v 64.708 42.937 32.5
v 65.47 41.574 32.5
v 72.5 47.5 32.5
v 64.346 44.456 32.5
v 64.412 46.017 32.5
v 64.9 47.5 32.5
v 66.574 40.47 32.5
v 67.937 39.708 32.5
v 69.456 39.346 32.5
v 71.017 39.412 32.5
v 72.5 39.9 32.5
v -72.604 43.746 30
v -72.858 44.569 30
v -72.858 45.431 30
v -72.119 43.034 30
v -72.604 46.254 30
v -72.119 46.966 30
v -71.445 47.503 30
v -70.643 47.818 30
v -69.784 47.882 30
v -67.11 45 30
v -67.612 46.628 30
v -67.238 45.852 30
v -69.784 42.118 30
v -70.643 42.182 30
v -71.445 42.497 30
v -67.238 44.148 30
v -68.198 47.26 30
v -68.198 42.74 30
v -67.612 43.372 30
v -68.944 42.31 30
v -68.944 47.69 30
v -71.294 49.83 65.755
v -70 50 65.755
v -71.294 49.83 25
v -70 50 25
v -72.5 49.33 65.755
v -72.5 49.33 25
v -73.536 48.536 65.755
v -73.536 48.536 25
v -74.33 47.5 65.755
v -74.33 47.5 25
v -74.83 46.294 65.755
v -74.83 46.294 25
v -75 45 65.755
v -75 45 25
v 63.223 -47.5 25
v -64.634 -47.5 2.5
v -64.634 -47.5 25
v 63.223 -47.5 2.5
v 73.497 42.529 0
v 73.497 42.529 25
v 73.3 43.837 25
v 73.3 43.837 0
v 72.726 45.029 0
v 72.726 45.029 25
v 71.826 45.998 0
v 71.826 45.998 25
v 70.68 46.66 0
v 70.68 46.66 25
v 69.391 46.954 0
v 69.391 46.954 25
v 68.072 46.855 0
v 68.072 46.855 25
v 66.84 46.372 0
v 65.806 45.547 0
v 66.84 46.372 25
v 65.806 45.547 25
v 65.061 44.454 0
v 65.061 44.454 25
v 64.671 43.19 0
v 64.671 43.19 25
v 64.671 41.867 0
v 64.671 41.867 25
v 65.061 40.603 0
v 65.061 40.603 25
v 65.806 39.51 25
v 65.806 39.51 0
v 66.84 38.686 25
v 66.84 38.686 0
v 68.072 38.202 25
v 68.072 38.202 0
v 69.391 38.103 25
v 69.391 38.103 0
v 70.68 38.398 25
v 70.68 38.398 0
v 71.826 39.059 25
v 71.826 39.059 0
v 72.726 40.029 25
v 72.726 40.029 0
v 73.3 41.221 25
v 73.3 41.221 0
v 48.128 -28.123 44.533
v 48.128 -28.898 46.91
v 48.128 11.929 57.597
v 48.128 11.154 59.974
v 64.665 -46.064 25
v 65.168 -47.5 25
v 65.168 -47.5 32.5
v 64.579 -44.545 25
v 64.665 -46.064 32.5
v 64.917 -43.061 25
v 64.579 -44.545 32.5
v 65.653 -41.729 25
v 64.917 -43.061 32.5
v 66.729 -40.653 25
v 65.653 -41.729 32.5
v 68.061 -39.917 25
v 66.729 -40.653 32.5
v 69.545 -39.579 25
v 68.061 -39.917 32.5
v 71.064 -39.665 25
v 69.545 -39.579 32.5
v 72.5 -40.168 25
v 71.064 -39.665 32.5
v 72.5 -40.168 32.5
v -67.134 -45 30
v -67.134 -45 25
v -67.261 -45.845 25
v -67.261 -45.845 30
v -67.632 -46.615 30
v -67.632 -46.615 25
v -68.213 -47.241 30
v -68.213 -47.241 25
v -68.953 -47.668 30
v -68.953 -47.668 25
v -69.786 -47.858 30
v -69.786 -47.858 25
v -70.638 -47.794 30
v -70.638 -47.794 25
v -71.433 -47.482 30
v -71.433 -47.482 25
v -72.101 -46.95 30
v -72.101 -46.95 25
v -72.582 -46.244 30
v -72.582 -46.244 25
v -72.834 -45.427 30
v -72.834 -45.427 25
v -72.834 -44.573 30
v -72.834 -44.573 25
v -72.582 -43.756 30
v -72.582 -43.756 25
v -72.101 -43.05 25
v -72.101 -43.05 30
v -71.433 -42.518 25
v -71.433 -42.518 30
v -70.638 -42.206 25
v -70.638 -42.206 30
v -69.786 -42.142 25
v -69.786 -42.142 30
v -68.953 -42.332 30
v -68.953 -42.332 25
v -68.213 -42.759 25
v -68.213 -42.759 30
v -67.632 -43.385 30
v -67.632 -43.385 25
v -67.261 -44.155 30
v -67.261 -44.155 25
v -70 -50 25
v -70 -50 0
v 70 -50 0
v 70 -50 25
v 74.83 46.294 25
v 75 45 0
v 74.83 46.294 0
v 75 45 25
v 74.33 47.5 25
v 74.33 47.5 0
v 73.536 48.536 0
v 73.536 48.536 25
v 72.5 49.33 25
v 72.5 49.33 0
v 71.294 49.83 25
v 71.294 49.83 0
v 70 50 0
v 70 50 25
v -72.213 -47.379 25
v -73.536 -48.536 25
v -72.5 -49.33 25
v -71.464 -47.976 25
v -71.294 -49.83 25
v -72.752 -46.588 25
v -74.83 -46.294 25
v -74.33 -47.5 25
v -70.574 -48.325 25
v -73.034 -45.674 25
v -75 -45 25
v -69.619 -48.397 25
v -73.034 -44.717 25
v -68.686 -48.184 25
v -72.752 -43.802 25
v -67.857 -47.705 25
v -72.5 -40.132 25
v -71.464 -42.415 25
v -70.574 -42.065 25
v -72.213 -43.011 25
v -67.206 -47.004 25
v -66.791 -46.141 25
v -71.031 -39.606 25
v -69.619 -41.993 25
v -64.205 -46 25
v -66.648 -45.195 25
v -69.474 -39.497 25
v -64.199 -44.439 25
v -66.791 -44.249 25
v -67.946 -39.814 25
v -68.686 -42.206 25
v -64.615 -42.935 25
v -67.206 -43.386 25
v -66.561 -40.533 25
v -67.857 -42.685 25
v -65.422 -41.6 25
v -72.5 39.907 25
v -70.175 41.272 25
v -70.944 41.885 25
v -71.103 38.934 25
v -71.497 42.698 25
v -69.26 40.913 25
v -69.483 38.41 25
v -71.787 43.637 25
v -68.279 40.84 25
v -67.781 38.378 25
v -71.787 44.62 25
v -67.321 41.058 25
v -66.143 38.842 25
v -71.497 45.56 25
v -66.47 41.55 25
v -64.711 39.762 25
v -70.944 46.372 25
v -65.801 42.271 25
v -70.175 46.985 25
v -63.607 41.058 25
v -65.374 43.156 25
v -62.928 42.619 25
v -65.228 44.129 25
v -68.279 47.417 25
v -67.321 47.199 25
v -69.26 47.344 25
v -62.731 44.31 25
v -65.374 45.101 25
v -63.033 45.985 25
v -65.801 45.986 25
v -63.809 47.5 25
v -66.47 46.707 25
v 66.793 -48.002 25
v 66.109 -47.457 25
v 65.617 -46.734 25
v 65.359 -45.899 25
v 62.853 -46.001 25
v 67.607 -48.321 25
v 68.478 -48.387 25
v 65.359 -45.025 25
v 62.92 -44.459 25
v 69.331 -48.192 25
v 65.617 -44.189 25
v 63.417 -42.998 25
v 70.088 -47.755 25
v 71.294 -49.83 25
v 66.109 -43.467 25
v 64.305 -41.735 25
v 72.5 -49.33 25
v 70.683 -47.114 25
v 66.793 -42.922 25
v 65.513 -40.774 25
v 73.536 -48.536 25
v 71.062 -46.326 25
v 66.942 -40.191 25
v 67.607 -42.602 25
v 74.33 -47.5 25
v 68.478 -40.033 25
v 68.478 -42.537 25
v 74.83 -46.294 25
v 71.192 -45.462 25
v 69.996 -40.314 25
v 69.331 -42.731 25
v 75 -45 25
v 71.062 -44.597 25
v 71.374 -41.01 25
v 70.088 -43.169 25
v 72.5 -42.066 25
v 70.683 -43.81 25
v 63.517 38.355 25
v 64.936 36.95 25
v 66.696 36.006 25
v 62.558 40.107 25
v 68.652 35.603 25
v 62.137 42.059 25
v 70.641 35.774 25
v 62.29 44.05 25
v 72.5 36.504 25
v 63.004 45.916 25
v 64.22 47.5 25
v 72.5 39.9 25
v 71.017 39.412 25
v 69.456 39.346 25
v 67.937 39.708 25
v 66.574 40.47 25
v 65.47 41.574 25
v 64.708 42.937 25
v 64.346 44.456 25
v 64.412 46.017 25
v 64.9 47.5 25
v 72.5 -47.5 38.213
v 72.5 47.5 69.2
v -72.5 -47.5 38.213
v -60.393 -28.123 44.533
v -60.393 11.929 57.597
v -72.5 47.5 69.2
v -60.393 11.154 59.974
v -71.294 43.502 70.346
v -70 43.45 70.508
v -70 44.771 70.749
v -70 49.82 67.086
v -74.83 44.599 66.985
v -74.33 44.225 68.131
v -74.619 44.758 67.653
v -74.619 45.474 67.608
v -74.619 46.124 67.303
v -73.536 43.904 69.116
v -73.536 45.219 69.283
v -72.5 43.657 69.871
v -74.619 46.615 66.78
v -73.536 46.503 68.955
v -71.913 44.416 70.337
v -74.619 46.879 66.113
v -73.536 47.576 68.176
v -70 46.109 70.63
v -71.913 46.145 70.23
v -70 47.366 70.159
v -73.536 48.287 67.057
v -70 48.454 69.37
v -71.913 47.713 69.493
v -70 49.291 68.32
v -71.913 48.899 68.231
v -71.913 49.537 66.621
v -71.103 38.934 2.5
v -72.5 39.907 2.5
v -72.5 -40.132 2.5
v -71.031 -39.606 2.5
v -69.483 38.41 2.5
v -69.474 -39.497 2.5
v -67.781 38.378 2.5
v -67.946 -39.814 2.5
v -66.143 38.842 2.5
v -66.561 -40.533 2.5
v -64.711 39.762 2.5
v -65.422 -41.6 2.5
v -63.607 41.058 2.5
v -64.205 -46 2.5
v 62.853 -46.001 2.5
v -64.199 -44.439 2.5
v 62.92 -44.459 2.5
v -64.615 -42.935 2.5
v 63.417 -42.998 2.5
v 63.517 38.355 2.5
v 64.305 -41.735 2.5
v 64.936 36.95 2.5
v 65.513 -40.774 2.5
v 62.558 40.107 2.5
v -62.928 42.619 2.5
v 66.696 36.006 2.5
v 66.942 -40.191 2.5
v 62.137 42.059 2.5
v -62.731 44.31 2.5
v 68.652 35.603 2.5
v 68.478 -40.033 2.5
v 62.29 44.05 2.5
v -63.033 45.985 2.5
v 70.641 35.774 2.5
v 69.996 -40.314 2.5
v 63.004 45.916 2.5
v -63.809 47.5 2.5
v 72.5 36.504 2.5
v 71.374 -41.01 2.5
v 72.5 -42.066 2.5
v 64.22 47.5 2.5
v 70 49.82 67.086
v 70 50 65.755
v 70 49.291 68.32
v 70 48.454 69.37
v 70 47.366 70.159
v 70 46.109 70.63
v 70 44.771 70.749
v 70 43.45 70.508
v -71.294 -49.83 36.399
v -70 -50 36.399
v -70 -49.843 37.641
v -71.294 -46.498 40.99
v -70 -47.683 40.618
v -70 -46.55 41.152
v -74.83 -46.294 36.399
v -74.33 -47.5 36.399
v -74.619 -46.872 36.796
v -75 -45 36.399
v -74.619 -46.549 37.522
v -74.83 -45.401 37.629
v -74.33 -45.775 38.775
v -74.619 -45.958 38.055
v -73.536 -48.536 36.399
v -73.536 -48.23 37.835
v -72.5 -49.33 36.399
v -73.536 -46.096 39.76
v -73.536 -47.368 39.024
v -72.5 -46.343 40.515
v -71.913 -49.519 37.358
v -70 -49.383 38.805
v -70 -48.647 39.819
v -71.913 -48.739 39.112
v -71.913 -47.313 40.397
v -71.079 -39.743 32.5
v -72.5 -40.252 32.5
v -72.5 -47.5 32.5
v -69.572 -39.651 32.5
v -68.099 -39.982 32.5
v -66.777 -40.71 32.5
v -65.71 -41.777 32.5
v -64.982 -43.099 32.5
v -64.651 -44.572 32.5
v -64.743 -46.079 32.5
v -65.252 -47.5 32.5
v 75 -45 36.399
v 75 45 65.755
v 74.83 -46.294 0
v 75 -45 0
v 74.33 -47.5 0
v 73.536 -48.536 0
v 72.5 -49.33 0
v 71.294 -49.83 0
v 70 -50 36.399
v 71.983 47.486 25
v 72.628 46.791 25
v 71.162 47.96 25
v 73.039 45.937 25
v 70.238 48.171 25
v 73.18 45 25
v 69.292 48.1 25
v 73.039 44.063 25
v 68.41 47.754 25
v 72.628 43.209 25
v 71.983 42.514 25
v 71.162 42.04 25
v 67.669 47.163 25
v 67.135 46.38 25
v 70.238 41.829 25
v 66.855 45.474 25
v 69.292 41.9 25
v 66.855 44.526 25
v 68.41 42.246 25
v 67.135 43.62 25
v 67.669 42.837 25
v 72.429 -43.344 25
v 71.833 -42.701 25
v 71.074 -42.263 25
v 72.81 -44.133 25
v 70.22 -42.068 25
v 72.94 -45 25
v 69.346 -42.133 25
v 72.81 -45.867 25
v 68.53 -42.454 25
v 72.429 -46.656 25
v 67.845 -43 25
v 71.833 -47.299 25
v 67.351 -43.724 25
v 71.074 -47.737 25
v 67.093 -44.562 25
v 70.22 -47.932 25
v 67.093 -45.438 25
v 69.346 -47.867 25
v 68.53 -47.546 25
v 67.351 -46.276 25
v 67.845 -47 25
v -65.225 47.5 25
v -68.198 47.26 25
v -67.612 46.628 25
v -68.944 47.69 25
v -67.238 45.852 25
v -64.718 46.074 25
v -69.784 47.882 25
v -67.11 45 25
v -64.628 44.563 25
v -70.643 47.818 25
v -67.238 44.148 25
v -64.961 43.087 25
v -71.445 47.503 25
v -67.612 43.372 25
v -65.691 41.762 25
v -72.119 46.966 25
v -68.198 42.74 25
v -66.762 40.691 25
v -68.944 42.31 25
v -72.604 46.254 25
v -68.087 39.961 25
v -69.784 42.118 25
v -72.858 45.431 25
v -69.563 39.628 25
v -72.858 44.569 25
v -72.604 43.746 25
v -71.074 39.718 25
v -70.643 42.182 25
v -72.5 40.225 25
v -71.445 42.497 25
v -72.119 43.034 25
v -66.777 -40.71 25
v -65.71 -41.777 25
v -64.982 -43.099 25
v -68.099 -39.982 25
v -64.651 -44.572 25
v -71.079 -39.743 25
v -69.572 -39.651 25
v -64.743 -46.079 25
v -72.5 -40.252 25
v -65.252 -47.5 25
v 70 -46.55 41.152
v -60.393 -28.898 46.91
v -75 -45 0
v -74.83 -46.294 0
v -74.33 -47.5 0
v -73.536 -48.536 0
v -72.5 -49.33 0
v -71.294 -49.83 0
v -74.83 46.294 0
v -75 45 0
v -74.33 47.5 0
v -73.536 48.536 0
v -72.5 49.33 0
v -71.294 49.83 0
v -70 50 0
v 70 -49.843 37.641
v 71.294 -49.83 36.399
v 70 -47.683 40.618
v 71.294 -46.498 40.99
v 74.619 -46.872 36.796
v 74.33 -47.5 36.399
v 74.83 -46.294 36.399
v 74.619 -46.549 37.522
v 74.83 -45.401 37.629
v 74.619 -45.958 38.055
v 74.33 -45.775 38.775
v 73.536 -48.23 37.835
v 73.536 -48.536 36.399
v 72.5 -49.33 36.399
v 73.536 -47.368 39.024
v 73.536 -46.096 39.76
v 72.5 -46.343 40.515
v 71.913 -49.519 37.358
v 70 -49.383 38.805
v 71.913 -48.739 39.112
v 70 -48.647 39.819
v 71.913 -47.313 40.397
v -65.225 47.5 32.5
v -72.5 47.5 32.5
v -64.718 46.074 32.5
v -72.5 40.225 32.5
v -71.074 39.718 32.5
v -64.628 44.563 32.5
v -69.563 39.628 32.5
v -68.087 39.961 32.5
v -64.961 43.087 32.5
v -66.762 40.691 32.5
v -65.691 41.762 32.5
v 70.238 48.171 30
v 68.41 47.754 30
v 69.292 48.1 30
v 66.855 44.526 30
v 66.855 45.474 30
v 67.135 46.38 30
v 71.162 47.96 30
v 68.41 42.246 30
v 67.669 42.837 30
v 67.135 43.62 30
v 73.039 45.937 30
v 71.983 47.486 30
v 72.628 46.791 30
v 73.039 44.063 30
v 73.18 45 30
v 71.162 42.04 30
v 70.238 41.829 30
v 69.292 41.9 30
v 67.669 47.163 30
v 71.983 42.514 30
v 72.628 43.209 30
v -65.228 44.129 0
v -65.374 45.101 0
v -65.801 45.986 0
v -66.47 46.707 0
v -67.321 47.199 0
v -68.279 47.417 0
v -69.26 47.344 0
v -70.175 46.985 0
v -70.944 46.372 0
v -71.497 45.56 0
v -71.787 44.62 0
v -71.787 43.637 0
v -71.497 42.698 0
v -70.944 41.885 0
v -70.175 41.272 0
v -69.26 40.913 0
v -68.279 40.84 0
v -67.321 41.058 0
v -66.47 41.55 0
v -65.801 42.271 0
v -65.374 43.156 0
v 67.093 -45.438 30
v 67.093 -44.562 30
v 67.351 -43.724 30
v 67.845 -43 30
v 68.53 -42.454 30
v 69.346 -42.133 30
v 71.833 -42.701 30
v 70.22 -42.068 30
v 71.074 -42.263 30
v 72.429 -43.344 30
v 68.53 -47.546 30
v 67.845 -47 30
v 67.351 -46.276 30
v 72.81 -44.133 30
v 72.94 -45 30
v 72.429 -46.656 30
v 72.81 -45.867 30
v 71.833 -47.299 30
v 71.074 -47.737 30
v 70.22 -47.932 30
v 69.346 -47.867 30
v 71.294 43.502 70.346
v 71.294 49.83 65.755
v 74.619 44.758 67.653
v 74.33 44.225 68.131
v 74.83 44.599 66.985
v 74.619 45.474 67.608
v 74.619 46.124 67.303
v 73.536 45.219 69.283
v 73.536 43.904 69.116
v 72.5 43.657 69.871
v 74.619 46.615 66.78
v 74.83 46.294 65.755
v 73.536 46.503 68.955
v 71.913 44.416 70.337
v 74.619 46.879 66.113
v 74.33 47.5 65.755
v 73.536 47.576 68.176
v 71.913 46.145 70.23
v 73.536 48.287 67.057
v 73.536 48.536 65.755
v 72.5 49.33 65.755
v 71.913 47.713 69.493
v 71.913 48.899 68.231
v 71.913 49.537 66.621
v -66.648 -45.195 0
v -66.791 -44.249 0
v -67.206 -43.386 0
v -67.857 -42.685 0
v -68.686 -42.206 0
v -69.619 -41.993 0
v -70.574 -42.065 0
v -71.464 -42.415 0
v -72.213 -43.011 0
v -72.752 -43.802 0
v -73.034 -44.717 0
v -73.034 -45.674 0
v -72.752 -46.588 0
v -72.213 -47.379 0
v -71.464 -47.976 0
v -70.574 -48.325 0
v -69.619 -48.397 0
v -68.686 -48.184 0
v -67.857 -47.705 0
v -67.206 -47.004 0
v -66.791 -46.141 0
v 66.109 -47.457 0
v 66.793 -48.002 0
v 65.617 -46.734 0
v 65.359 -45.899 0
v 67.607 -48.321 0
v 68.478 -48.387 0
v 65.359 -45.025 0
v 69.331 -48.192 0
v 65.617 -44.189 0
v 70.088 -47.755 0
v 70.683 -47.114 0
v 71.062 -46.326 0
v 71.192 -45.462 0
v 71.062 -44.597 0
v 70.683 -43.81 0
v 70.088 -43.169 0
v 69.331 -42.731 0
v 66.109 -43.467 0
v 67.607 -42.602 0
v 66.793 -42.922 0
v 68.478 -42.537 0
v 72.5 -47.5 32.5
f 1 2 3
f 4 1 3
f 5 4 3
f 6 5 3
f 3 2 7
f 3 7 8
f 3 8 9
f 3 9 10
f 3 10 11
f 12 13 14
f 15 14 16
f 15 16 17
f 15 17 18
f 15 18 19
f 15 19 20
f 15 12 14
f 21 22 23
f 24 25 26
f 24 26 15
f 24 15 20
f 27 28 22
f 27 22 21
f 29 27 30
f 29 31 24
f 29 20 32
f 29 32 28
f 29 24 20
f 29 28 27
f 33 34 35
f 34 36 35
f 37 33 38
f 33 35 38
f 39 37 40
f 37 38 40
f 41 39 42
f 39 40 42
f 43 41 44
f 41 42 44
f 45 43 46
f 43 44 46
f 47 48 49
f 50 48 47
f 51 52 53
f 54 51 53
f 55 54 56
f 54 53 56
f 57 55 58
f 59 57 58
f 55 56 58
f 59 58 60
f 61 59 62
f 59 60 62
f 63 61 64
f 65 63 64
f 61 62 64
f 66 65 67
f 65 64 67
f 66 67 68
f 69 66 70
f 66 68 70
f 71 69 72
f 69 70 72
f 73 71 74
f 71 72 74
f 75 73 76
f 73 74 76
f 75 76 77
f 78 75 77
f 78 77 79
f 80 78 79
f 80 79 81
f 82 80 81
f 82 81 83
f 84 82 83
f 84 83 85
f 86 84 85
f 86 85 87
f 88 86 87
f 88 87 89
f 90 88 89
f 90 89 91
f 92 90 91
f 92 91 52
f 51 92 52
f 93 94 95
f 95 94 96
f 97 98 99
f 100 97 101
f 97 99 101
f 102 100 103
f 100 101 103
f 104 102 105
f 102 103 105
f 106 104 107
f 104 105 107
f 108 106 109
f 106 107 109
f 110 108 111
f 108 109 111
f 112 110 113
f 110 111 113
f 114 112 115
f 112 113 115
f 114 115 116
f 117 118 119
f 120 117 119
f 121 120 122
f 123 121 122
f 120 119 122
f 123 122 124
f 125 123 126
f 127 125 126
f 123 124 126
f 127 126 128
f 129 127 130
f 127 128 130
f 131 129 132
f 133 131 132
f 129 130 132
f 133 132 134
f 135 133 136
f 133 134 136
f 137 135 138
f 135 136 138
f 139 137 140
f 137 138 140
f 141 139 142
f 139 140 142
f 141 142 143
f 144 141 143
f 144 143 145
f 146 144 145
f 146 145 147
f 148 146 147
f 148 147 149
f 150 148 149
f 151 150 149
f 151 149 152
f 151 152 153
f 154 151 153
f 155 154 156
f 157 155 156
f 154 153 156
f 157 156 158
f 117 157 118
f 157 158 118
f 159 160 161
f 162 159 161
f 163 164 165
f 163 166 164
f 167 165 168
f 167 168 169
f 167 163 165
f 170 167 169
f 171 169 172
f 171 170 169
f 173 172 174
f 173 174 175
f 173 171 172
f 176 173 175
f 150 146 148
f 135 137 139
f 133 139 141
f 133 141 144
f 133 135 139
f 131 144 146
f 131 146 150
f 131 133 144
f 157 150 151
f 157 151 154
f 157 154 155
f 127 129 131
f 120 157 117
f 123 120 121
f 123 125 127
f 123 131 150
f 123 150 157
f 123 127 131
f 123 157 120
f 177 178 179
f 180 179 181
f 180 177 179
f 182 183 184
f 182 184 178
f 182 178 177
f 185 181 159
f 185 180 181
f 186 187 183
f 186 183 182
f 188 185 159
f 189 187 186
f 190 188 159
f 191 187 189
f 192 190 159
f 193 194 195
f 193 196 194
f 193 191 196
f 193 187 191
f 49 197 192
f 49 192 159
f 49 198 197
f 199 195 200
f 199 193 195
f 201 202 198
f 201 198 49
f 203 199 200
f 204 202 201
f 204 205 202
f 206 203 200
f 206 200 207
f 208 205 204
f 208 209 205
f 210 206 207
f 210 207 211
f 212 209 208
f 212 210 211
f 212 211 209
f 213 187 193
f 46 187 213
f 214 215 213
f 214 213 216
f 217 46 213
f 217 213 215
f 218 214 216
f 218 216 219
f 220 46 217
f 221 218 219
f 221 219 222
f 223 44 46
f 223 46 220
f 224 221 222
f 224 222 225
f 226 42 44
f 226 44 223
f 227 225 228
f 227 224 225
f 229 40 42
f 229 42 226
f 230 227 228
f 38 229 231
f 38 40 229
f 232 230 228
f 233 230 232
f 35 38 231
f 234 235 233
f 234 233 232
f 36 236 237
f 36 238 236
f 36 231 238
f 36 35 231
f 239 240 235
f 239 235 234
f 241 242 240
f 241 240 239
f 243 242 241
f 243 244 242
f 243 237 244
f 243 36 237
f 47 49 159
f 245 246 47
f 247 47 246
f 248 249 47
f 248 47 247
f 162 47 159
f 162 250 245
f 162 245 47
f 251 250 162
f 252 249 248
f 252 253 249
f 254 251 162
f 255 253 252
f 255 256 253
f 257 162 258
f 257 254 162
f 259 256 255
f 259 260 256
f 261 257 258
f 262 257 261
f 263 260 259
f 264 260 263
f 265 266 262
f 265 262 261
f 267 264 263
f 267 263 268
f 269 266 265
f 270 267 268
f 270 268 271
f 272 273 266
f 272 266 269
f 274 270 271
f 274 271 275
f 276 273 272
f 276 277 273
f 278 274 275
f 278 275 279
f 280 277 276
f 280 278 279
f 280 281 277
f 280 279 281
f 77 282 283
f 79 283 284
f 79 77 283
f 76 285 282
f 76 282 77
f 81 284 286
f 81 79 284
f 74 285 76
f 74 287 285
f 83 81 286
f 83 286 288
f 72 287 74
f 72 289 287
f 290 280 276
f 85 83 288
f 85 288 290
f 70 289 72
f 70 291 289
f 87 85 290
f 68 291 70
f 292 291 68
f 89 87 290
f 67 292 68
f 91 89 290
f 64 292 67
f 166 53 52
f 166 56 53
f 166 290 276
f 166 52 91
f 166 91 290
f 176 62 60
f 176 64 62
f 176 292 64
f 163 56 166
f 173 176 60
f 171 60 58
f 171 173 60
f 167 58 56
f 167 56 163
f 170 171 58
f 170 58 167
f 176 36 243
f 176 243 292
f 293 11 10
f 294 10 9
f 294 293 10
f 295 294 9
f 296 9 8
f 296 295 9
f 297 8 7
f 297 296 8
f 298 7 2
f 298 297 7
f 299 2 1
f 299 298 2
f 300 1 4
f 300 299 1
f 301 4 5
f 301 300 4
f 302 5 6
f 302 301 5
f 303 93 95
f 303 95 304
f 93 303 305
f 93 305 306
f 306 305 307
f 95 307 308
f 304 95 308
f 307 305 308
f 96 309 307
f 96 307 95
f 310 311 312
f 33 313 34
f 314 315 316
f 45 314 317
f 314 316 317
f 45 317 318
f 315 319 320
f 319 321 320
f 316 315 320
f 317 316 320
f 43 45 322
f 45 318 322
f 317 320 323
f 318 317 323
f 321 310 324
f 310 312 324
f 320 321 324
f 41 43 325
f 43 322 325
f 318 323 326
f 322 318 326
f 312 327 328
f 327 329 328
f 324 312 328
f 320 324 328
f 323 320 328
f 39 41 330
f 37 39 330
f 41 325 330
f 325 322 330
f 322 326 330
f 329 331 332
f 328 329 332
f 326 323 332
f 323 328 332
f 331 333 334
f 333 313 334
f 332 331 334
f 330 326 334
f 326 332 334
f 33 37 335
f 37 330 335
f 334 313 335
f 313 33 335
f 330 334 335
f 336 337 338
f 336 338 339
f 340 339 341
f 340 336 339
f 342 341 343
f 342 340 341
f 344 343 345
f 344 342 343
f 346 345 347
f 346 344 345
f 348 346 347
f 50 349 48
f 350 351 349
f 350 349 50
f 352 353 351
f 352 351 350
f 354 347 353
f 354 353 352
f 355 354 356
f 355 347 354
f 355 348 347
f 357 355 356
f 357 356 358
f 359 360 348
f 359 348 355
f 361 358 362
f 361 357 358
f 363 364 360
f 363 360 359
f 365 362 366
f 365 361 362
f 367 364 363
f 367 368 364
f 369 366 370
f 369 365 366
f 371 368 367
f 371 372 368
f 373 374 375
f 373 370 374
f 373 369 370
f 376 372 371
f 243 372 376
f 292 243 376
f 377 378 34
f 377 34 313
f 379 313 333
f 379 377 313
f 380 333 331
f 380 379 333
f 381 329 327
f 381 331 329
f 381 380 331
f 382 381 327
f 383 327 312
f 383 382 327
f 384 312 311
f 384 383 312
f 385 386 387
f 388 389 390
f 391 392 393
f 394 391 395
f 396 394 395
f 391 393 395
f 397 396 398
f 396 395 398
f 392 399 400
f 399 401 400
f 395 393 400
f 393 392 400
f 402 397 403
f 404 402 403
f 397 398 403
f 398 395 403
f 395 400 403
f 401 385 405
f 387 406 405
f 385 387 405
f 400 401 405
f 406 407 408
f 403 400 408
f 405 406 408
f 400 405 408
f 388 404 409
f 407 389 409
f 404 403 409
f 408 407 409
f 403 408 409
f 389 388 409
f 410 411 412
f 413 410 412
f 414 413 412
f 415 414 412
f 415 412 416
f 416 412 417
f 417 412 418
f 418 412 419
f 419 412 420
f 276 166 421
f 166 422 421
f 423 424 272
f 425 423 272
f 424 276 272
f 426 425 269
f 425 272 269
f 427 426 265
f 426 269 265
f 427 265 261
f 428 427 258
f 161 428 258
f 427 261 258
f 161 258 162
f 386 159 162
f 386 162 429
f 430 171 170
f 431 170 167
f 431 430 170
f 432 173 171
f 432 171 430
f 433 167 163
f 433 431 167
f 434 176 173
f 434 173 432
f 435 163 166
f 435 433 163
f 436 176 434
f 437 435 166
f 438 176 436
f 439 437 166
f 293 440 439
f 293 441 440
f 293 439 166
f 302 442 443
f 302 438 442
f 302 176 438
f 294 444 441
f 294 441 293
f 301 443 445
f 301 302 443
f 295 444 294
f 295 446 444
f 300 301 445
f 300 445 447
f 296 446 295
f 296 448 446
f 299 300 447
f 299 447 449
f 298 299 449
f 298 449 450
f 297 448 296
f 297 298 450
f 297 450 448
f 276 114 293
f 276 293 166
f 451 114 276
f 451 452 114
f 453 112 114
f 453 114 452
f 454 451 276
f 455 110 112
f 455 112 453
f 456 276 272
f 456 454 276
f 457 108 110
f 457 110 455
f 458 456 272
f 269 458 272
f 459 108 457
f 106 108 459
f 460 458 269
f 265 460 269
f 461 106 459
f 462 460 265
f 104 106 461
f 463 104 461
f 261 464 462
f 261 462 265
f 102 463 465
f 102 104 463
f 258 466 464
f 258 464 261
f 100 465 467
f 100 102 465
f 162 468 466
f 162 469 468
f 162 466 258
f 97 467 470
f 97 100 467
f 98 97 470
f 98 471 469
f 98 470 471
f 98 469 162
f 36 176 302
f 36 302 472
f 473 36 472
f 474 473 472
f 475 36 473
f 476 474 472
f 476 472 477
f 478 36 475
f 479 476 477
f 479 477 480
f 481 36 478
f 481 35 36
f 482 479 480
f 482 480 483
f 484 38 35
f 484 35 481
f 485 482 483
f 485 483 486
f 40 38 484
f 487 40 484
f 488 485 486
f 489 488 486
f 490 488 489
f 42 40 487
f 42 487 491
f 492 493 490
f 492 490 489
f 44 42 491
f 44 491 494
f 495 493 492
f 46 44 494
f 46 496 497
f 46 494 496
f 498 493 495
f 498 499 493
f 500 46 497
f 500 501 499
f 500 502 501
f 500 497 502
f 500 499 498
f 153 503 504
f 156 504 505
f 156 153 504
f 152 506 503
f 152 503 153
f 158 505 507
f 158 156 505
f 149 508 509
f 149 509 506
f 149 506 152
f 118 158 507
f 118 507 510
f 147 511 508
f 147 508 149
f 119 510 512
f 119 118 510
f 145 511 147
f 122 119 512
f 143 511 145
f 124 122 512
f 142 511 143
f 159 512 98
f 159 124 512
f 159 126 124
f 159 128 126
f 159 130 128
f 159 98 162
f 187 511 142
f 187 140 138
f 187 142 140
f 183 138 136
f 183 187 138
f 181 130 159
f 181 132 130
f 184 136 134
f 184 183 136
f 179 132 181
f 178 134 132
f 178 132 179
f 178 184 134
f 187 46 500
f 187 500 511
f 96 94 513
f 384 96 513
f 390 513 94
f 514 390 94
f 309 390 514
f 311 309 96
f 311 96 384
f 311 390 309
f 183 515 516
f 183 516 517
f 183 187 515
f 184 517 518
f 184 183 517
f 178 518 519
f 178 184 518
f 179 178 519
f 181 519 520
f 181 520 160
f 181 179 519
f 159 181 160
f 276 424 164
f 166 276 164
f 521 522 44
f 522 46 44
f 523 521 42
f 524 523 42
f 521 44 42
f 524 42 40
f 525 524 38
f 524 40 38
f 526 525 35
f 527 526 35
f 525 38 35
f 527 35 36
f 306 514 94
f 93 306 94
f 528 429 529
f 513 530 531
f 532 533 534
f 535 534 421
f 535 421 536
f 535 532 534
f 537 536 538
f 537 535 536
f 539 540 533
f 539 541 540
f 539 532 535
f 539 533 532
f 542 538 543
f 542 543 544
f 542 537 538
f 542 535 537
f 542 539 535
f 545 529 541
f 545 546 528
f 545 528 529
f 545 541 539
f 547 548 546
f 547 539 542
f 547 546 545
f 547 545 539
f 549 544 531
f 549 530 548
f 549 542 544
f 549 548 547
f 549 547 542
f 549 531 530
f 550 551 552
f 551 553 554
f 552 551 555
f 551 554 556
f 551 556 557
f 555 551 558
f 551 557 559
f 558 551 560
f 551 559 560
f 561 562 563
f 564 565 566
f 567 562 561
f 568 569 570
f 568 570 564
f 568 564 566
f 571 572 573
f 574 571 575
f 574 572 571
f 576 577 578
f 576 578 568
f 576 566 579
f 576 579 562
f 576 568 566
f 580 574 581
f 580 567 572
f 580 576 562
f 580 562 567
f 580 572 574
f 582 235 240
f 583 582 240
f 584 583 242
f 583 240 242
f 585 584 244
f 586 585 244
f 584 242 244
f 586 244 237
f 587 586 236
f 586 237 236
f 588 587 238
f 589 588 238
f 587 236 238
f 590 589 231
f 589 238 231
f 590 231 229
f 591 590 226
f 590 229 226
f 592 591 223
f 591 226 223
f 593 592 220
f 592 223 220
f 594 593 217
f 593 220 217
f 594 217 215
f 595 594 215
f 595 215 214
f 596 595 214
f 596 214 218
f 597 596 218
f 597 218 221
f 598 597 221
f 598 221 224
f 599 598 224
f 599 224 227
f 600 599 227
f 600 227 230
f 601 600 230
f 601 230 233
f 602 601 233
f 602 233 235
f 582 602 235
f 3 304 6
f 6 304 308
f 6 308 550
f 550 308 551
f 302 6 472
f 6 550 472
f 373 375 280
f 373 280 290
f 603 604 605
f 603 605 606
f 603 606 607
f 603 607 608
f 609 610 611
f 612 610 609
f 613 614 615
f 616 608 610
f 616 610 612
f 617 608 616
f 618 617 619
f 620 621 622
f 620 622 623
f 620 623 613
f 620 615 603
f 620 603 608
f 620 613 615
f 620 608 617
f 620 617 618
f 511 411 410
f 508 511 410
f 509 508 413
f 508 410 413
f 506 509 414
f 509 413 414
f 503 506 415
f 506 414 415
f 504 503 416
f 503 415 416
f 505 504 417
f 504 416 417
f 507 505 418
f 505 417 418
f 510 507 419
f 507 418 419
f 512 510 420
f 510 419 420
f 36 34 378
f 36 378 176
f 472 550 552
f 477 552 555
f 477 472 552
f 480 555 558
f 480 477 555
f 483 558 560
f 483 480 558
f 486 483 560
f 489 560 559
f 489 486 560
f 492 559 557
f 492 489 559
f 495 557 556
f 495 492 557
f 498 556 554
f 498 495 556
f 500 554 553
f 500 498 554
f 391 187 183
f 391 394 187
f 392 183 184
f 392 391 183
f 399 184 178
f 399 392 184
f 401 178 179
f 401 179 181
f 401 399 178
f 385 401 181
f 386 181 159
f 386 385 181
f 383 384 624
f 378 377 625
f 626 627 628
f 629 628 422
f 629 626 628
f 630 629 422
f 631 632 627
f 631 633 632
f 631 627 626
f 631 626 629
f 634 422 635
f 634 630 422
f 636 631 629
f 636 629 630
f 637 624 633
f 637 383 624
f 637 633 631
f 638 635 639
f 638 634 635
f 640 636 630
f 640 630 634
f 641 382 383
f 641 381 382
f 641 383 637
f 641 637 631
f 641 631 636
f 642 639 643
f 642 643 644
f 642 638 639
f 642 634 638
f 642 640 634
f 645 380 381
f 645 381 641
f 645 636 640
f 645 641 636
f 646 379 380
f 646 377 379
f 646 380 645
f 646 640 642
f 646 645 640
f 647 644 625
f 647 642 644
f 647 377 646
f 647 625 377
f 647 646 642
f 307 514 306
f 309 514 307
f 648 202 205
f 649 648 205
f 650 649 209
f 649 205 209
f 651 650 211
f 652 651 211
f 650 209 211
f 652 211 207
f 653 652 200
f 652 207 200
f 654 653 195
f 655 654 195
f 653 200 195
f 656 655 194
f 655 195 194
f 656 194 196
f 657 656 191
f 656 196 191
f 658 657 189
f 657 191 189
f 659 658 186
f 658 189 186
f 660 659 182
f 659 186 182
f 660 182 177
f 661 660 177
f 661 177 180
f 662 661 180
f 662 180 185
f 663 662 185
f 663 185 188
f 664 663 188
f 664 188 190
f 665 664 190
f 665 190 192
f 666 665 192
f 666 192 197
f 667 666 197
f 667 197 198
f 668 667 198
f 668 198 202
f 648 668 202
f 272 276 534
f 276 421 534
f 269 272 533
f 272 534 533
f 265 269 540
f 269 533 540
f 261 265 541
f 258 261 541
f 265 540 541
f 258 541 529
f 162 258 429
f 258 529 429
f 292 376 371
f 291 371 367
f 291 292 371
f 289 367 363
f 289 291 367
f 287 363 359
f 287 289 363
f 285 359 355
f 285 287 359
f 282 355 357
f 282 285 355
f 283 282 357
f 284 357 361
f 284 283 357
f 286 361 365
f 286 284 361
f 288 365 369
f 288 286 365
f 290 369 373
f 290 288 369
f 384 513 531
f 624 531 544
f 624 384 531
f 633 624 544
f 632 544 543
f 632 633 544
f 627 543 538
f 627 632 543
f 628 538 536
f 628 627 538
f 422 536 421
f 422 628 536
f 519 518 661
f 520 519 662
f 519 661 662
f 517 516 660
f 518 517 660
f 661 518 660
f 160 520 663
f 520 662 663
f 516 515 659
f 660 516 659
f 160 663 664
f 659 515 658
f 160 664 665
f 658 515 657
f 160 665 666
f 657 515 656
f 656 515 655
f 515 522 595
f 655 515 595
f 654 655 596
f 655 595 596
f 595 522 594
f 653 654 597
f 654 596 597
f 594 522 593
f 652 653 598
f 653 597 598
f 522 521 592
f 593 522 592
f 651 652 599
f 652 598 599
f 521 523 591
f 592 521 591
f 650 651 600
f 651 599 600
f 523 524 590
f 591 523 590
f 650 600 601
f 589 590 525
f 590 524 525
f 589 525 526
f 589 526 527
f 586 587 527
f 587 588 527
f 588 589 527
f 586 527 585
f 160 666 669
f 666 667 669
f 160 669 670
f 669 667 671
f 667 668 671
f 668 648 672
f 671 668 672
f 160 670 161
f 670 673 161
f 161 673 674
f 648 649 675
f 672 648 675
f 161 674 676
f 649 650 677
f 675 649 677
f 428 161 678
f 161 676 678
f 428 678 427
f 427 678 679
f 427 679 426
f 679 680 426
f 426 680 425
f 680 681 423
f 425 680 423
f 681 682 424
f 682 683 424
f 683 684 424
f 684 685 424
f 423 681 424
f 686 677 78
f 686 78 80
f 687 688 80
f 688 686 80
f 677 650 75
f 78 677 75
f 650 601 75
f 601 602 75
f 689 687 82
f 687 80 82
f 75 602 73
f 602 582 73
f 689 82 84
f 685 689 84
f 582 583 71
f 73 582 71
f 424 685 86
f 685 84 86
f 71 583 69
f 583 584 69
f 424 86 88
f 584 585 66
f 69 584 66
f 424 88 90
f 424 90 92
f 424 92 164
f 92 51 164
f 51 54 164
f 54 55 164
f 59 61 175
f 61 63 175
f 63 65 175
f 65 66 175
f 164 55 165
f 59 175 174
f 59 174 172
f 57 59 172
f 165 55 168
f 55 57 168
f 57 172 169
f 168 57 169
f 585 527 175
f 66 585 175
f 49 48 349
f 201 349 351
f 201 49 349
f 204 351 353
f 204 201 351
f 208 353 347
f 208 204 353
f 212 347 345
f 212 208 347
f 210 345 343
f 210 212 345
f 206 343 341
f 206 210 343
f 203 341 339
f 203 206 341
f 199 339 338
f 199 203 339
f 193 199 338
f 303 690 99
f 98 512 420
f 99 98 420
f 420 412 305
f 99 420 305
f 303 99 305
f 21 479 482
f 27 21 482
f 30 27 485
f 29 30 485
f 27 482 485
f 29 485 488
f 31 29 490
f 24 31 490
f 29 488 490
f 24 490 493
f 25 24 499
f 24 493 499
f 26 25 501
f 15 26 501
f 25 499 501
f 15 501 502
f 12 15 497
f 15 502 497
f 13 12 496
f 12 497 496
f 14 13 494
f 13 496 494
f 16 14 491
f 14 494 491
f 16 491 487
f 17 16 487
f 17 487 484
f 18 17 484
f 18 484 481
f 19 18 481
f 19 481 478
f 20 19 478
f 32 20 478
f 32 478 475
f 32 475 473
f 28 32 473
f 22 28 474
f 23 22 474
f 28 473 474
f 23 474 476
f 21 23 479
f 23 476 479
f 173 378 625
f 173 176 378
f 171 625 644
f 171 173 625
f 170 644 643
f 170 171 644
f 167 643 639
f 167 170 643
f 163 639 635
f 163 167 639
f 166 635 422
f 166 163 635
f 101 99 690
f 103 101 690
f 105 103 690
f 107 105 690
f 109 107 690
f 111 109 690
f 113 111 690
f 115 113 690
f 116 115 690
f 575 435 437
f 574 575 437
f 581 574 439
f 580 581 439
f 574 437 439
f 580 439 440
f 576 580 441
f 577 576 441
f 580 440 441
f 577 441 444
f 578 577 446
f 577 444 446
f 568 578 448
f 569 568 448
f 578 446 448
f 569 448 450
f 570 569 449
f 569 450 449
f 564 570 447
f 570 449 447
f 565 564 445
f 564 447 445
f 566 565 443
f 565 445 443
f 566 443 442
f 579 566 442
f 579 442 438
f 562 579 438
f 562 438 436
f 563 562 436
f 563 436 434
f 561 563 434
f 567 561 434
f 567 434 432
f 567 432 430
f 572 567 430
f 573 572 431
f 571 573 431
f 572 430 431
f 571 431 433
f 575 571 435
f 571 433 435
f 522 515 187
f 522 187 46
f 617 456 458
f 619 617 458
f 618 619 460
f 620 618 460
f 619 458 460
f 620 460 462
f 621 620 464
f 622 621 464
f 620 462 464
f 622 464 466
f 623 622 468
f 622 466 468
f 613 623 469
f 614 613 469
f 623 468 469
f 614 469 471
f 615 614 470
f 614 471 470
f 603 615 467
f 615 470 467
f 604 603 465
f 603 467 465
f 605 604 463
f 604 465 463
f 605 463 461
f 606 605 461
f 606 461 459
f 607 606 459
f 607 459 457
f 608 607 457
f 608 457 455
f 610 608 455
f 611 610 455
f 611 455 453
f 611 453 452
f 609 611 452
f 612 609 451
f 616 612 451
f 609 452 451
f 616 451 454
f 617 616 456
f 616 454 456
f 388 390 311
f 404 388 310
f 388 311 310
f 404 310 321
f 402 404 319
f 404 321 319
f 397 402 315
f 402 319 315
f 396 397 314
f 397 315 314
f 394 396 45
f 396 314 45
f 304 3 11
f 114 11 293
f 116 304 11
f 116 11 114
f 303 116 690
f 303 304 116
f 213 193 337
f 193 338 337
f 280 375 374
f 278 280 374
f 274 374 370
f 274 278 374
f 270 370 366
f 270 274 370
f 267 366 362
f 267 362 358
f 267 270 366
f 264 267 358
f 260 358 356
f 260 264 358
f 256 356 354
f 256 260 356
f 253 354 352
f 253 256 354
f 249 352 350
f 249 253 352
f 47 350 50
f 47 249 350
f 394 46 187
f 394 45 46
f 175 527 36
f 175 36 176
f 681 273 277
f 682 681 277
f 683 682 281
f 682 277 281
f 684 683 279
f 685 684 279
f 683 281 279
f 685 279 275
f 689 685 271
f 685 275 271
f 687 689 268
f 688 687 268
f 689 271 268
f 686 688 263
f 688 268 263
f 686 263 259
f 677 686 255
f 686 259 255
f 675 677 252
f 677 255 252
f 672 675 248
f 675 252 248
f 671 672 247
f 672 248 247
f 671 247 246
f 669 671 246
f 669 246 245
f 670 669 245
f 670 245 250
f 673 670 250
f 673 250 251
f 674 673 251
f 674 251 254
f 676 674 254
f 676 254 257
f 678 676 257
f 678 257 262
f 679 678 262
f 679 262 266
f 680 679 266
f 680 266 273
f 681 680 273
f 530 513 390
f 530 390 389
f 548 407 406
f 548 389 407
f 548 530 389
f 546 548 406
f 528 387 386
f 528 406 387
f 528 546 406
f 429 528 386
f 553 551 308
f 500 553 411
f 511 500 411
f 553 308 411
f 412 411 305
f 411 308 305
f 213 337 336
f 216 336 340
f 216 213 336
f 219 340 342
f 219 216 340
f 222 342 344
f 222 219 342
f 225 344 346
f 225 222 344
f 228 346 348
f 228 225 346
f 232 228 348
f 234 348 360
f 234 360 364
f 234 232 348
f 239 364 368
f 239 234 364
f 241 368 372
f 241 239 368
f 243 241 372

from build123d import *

# Parameters (mm, degrees)
F0_W      = 150
F0_H      = 100
F1_DEPTH  = 25
F2_R      = 3.2981256226
F2_R_2    = 3.2107397339
F2_R_3    = 2.9330141842
F2_R_4    = 4.4377369933
F3_DEPTH  = 25.001
F4_T      = -2.5
F6_DEPTH  = 150
F7_R      = 2.8661980647
F7_R_2    = 2.890017818
F7_R_3    = 3.1801309688
F7_R_4    = 2.9402334405
F8_DEPTH  = 5
F9_T      = 2.5
F10_W     = 108.5215471685
F10_H     = 42.1287603676
F11_DEPTH = 69.0646432345
F12_R     = 5
F13_R     = 5


# Not quite as in the source:
# - a shell that OpenCascade refuses in one call is made with other operations: the cavity is built on its own and cut out


with BuildPart() as f1:
    # F0 (on Top) → F1 (new body)
    with BuildSketch(Plane.XY):
        Rectangle(F0_W, F0_H)
    extrude(amount=F1_DEPTH)

    # F2 (on face) → F3 (cut, through all)
    with BuildSketch(Plane.XY.offset(25)):
        with Locations((-68.5258954763, 44.1285409033)):
            Circle(F2_R)
        with Locations((-69.8590800166, -45.1950915158)):
            Circle(F2_R_2)
        with Locations((68.2592540979, -45.4617291689)):
            Circle(F2_R_3)
        with Locations((69.059163332, 42.5287149847)):
            Circle(F2_R_4)
    extrude(amount=-F3_DEPTH, mode=Mode.SUBTRACT)

    # F4
    f4_openings = [f1.faces().sort_by_distance(p)[0] for p in [
        (-0.101934, -0.097469, 25),
    ]]
    offset(amount=F4_T, openings=f4_openings)

    # F13
    f13_edges = [f1.edges().sort_by_distance(p)[0] for p in [
        (-75, -50, 12.5),
        (75, -50, 12.5),
        (75, 50, 12.5),
        (-75, 50, 12.5),
    ]]
    fillet(f13_edges, radius=F13_R)


with BuildPart() as f6:
    # F5 (on face) → F6 (new body, through all)
    with BuildSketch(Plane(origin=(-75, 0, 0), x_dir=(0, -1, 0), z_dir=(-1, 0, 0))):
        Polygon((-50, 72.6446807384), (-50, 25), (50, 25), (50, 40.0270335376), align=None)
    extrude(amount=-F6_DEPTH)

    # F7 (on face) → F8 (cut)
    with BuildSketch(Plane(origin=(0, 0, 25), x_dir=(1, 0, 0), z_dir=(0, 0, -1))):
        with Locations((-70, 45)):
            Circle(F7_R)
        with Locations((-70, -45)):
            Circle(F7_R_2)
        with Locations((70, -45)):
            Circle(F7_R_3)
        with Locations((70, 45)):
            Circle(F7_R_4)
    extrude(amount=-F8_DEPTH, mode=Mode.SUBTRACT)

    # F9: shell of thickness 2.5, made by hand


with BuildPart() as f9_core1:
    # F9_t2: copy of F6
    add(f6.part)

    # the walls: a layer under each face that stays
    f9_faces = [f9_core1.faces().sort_by_distance(p)[0] for p in [
        (0, 0, 56.335857138),
        (0, -50, 32.5135167688),
        (0, 50, 48.8223403692),
        (-75, 0, 48.8223403692),
        (75, 0, 48.8223403692),
        (66.8198690312, 45, 27.5),
        (67.0597665595, -45, 27.5),
        (-72.890017818, 45, 27.5),
        (-72.8661980647, -45, 27.5),
        (70, 45, 30),
        (70, -45, 30),
        (-70, 45, 30),
        (-70, -45, 30),
    ]]
    thicken(f9_faces, amount=-F9_T, mode=Mode.SUBTRACT)

    # F9_s3 → F9_t4 (revolve, cut)
    with BuildSketch(Plane.XZ.offset(-45)):
        Polygon((73.1551309688, 29.975), (75.6801309688, 30), (75.6801309688, 32.5), (73.1801309688, 32.5), align=None)
    revolve(axis=Axis((70, 45, 30), (0, 0, -1)), mode=Mode.SUBTRACT)

    # F9_s5 → F9_t6 (revolve, cut)
    with BuildSketch(Plane.XZ.offset(45)):
        Polygon((72.9152334405, 29.975), (75.4402334405, 30), (75.4402334405, 32.5), (72.9402334405, 32.5), align=None)
    revolve(axis=Axis((70, -45, 30), (0, 0, -1)), mode=Mode.SUBTRACT)

    # F9_s7 → F9_t8 (revolve, cut)
    with BuildSketch(Plane.XZ.offset(-45)):
        Polygon((-67.134982182, 29.975), (-64.609982182, 30), (-64.609982182, 32.5), (-67.109982182, 32.5), align=None)
    revolve(axis=Axis((-70, 45, 30), (0, 0, -1)), mode=Mode.SUBTRACT)

    # F9_s9 → F9_t10 (revolve, cut)
    with BuildSketch(Plane.XZ.offset(45)):
        Polygon((-67.1588019353, 29.975), (-64.6338019353, 30), (-64.6338019353, 32.5), (-67.1338019353, 32.5), align=None)
    revolve(axis=Axis((-70, -45, 30), (0, 0, -1)), mode=Mode.SUBTRACT)


with BuildPart() as f6_1:
    add(f6.part)

    # what is left inside the walls is the cavity
    f9_cavity = [f9_core1.part.solids().sort_by_distance(p)[0] for p in [
        (24.166667, 0.007752, 53.682461),
    ]]
    add(f9_cavity, mode=Mode.SUBTRACT)

    # F10 (on face) → F11 (cut, through all)
    with BuildSketch(Plane(origin=(0, -16.6084409755, 50.9185744551), x_dir=(1, 0, 0), z_dir=(0, -0.3100975221, 0.9507047527))):
        with Locations((-6.1326678842, 8.1372950226)):
            Rectangle(F10_W, F10_H)
    extrude(amount=-F11_DEPTH, mode=Mode.SUBTRACT)

    # F12
    f12_edges = [f6_1.edges().sort_by_distance(p)[0] for p in [
        (0, 50, 72.644681),
        (-75, 0, 56.335857),
        (75, 0, 56.335857),
        (0, -50, 40.027034),
        (-75, -50, 32.513517),
        (75, -50, 32.513517),
        (75, 50, 48.82234),
        (-75, 50, 48.82234),
    ]]
    fillet(f12_edges, radius=F12_R)


solid = Compound([f1.part, f6_1.part])
